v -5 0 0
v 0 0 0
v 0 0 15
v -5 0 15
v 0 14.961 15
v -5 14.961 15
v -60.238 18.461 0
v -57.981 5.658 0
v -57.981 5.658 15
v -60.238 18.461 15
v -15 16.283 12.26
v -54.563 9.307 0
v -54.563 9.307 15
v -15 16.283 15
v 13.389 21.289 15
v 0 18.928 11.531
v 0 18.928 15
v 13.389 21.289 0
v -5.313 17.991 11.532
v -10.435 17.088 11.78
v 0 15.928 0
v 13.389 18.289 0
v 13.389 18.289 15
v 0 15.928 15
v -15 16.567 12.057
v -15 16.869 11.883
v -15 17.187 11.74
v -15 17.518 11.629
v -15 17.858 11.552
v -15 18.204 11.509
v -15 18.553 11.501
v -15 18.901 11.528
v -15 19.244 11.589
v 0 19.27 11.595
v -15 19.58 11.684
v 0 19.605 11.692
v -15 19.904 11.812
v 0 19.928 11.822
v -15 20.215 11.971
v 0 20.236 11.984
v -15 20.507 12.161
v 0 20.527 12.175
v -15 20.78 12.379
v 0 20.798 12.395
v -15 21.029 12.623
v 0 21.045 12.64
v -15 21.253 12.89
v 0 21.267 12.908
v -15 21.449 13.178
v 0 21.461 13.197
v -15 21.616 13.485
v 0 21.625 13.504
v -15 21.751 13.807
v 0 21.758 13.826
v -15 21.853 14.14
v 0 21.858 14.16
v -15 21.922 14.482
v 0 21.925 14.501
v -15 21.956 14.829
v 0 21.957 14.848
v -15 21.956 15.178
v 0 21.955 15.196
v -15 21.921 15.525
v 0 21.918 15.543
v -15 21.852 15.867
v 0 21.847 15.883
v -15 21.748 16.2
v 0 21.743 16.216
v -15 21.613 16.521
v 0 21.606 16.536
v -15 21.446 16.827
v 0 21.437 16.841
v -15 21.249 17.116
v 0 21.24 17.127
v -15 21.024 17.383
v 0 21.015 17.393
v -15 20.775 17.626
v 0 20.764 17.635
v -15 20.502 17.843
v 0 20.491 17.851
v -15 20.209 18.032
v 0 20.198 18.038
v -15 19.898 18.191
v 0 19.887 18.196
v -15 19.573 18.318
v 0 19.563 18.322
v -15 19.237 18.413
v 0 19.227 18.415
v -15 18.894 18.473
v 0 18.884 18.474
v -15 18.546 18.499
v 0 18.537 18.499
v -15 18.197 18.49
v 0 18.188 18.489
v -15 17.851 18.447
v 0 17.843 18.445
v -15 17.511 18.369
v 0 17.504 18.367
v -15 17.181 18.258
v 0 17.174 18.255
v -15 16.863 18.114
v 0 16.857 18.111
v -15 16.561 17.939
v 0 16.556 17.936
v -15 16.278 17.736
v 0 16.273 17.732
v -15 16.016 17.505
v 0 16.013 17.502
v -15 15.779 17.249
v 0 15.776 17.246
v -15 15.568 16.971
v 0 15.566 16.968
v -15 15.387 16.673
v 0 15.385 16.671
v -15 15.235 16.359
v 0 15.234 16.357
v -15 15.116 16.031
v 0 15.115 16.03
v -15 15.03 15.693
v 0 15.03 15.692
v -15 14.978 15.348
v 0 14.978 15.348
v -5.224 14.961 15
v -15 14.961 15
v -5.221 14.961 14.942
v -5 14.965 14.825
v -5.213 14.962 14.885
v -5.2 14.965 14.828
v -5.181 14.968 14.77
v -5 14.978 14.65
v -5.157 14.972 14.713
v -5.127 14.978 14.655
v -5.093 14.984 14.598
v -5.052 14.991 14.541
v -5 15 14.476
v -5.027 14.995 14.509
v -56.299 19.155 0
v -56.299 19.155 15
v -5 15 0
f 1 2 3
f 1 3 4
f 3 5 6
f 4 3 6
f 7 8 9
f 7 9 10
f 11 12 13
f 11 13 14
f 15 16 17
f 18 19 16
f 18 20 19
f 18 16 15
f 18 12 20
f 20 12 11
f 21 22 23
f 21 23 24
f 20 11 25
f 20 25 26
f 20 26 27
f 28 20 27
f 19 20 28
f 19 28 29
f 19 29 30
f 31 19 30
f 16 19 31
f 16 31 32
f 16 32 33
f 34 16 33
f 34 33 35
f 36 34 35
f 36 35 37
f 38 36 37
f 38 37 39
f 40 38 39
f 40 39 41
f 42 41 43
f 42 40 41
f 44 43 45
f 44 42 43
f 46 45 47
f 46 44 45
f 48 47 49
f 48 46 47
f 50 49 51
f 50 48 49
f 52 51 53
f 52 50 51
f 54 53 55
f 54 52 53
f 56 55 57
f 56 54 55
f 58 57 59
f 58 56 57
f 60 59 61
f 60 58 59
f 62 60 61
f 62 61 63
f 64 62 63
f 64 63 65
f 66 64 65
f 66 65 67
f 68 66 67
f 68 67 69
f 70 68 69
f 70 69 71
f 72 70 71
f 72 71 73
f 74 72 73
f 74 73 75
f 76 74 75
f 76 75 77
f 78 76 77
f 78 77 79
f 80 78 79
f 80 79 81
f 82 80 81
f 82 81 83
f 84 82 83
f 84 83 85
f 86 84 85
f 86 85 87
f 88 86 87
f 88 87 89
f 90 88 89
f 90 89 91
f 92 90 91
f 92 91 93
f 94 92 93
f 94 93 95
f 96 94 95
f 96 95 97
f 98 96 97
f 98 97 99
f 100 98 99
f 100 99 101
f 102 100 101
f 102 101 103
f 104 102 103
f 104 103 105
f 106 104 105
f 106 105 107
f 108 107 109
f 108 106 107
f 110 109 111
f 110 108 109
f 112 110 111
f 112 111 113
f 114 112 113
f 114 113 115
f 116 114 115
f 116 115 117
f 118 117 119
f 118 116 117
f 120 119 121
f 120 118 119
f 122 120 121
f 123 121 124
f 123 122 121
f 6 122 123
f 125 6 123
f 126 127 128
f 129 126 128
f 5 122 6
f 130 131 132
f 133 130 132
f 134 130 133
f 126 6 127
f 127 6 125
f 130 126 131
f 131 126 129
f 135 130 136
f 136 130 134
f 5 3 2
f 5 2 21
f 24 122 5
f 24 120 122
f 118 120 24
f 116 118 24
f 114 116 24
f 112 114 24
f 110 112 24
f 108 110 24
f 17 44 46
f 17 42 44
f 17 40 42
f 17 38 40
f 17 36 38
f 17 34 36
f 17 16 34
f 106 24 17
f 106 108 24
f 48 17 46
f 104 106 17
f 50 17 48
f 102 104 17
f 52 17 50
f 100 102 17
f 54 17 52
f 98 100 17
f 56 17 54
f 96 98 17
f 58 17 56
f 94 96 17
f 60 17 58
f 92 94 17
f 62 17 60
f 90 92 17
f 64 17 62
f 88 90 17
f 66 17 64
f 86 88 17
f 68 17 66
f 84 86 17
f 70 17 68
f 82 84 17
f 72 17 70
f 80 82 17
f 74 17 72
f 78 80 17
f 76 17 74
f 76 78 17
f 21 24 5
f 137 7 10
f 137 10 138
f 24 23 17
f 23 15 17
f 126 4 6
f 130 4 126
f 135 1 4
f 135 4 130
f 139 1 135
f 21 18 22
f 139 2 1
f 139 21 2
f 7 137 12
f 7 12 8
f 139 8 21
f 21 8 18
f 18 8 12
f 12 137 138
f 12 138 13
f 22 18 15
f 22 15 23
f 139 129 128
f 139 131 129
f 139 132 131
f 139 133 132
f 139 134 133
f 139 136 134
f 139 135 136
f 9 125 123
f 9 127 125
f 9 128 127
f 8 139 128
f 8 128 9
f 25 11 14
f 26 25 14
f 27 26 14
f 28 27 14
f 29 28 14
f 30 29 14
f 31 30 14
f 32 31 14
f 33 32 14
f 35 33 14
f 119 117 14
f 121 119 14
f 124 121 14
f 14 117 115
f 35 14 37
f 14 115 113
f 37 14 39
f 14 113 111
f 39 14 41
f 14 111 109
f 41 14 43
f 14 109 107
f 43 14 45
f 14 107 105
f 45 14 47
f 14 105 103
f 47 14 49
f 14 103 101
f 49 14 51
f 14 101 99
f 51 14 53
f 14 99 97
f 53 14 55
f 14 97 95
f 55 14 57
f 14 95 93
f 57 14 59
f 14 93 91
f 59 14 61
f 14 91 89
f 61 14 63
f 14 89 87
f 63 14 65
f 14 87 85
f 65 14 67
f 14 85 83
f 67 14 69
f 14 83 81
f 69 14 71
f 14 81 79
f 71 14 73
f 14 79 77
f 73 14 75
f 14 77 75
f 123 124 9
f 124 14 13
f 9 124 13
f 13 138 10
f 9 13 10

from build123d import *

# Parameters (mm, degrees)
PAD_DEPTH    = 15
SKETCH001_R  = 3.5
PAD001_DEPTH = 15


with BuildPart() as part:
    # Sketch → Pad (new body)
    with BuildSketch(Plane.XY):
        Polygon((0, 0), (-5, 0), (-5, 15), (-57.980821, 5.658052), (-60.238248, 18.460553), (-56.299017, 19.155145), (-54.562535, 9.307068), (13.3892, 21.288792), (13.3892, 18.288792), (0, 15.927915), align=None)
    extrude(amount=PAD_DEPTH)

    # Sketch001 → Pad001 (new body)
    with BuildSketch(Plane.YZ):
        with Locations((18.460553, 15)):
            Circle(SKETCH001_R)
    extrude(amount=-PAD001_DEPTH)


solid = part.part
